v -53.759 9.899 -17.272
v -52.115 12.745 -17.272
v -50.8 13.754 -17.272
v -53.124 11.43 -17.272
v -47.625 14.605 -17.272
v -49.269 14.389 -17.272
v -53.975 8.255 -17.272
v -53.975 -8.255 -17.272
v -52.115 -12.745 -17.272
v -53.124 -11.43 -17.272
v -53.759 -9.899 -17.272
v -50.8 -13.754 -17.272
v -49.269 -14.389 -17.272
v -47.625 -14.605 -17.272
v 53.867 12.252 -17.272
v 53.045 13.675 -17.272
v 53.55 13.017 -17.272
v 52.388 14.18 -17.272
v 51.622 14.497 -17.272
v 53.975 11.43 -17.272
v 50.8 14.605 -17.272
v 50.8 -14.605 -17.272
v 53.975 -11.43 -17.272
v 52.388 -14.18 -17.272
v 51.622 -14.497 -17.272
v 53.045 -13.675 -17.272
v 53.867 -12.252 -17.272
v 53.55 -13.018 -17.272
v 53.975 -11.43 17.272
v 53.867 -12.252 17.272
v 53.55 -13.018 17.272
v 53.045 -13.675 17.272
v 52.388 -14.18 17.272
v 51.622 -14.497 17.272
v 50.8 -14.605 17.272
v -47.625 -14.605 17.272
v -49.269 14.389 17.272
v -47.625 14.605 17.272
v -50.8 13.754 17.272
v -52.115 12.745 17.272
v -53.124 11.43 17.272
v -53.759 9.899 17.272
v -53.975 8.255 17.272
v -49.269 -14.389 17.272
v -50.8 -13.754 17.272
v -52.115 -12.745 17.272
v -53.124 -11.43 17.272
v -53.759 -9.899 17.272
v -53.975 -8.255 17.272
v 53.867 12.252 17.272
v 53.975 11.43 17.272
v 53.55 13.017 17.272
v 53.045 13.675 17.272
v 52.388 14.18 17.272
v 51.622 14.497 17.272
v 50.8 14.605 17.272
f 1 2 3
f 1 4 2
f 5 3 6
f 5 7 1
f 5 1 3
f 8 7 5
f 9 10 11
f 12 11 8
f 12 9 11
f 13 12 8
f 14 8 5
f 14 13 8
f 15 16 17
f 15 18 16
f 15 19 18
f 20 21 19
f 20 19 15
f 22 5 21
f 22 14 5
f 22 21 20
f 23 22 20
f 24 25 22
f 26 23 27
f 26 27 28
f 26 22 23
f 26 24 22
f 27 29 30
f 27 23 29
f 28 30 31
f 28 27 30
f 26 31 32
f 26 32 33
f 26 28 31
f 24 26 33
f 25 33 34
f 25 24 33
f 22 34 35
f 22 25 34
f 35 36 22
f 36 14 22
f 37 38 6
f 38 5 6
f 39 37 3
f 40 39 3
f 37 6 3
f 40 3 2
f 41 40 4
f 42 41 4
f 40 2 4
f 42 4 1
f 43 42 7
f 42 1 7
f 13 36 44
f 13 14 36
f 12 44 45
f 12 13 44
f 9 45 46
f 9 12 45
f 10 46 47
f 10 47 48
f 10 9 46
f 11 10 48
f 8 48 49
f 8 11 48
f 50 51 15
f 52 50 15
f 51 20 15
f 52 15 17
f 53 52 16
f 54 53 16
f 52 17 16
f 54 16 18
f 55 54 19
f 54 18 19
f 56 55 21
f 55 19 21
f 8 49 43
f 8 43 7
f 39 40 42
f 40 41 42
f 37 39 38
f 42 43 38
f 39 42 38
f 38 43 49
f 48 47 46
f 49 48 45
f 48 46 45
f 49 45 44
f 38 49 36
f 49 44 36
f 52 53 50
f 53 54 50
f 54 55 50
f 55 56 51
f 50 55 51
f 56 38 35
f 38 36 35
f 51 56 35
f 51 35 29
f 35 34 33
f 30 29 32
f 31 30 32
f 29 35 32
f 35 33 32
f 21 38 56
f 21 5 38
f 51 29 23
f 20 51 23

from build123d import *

# Parameters (mm, degrees)
BOSS_EXTRUDE1_DEPTH      = 14.605
BOSS_EXTRUDE1_DEPTH_BACK = 14.605
SKETCH1_W                = 107.95
SKETCH1_H                = 34.544
FILLET1_R                = 3.175
FILLET2_R                = 6.35


with BuildPart() as part:
    # Sketch1 → Boss-Extrude1 (new, two sides: drawn at the far end of the back side and taken through both)
    with BuildSketch(Plane(origin=(0, 0, 0), x_dir=(1, 0, 0), z_dir=(0, 1, 0)).offset(-BOSS_EXTRUDE1_DEPTH_BACK)):
        Rectangle(SKETCH1_W, SKETCH1_H)
    extrude(amount=BOSS_EXTRUDE1_DEPTH + BOSS_EXTRUDE1_DEPTH_BACK)

    # Fillet1
    fillet1_edges = [part.edges().sort_by_distance(p)[0] for p in [
        (53.975, -14.605, 0),
        (53.975, 14.605, 0),
    ]]
    fillet(fillet1_edges, radius=FILLET1_R)

    # Fillet2
    fillet2_edges = [part.edges().sort_by_distance(p)[0] for p in [
        (-53.975, 14.605, 0),
        (-53.975, -14.605, 0),
    ]]
    fillet(fillet2_edges, radius=FILLET2_R)


solid = part.part
